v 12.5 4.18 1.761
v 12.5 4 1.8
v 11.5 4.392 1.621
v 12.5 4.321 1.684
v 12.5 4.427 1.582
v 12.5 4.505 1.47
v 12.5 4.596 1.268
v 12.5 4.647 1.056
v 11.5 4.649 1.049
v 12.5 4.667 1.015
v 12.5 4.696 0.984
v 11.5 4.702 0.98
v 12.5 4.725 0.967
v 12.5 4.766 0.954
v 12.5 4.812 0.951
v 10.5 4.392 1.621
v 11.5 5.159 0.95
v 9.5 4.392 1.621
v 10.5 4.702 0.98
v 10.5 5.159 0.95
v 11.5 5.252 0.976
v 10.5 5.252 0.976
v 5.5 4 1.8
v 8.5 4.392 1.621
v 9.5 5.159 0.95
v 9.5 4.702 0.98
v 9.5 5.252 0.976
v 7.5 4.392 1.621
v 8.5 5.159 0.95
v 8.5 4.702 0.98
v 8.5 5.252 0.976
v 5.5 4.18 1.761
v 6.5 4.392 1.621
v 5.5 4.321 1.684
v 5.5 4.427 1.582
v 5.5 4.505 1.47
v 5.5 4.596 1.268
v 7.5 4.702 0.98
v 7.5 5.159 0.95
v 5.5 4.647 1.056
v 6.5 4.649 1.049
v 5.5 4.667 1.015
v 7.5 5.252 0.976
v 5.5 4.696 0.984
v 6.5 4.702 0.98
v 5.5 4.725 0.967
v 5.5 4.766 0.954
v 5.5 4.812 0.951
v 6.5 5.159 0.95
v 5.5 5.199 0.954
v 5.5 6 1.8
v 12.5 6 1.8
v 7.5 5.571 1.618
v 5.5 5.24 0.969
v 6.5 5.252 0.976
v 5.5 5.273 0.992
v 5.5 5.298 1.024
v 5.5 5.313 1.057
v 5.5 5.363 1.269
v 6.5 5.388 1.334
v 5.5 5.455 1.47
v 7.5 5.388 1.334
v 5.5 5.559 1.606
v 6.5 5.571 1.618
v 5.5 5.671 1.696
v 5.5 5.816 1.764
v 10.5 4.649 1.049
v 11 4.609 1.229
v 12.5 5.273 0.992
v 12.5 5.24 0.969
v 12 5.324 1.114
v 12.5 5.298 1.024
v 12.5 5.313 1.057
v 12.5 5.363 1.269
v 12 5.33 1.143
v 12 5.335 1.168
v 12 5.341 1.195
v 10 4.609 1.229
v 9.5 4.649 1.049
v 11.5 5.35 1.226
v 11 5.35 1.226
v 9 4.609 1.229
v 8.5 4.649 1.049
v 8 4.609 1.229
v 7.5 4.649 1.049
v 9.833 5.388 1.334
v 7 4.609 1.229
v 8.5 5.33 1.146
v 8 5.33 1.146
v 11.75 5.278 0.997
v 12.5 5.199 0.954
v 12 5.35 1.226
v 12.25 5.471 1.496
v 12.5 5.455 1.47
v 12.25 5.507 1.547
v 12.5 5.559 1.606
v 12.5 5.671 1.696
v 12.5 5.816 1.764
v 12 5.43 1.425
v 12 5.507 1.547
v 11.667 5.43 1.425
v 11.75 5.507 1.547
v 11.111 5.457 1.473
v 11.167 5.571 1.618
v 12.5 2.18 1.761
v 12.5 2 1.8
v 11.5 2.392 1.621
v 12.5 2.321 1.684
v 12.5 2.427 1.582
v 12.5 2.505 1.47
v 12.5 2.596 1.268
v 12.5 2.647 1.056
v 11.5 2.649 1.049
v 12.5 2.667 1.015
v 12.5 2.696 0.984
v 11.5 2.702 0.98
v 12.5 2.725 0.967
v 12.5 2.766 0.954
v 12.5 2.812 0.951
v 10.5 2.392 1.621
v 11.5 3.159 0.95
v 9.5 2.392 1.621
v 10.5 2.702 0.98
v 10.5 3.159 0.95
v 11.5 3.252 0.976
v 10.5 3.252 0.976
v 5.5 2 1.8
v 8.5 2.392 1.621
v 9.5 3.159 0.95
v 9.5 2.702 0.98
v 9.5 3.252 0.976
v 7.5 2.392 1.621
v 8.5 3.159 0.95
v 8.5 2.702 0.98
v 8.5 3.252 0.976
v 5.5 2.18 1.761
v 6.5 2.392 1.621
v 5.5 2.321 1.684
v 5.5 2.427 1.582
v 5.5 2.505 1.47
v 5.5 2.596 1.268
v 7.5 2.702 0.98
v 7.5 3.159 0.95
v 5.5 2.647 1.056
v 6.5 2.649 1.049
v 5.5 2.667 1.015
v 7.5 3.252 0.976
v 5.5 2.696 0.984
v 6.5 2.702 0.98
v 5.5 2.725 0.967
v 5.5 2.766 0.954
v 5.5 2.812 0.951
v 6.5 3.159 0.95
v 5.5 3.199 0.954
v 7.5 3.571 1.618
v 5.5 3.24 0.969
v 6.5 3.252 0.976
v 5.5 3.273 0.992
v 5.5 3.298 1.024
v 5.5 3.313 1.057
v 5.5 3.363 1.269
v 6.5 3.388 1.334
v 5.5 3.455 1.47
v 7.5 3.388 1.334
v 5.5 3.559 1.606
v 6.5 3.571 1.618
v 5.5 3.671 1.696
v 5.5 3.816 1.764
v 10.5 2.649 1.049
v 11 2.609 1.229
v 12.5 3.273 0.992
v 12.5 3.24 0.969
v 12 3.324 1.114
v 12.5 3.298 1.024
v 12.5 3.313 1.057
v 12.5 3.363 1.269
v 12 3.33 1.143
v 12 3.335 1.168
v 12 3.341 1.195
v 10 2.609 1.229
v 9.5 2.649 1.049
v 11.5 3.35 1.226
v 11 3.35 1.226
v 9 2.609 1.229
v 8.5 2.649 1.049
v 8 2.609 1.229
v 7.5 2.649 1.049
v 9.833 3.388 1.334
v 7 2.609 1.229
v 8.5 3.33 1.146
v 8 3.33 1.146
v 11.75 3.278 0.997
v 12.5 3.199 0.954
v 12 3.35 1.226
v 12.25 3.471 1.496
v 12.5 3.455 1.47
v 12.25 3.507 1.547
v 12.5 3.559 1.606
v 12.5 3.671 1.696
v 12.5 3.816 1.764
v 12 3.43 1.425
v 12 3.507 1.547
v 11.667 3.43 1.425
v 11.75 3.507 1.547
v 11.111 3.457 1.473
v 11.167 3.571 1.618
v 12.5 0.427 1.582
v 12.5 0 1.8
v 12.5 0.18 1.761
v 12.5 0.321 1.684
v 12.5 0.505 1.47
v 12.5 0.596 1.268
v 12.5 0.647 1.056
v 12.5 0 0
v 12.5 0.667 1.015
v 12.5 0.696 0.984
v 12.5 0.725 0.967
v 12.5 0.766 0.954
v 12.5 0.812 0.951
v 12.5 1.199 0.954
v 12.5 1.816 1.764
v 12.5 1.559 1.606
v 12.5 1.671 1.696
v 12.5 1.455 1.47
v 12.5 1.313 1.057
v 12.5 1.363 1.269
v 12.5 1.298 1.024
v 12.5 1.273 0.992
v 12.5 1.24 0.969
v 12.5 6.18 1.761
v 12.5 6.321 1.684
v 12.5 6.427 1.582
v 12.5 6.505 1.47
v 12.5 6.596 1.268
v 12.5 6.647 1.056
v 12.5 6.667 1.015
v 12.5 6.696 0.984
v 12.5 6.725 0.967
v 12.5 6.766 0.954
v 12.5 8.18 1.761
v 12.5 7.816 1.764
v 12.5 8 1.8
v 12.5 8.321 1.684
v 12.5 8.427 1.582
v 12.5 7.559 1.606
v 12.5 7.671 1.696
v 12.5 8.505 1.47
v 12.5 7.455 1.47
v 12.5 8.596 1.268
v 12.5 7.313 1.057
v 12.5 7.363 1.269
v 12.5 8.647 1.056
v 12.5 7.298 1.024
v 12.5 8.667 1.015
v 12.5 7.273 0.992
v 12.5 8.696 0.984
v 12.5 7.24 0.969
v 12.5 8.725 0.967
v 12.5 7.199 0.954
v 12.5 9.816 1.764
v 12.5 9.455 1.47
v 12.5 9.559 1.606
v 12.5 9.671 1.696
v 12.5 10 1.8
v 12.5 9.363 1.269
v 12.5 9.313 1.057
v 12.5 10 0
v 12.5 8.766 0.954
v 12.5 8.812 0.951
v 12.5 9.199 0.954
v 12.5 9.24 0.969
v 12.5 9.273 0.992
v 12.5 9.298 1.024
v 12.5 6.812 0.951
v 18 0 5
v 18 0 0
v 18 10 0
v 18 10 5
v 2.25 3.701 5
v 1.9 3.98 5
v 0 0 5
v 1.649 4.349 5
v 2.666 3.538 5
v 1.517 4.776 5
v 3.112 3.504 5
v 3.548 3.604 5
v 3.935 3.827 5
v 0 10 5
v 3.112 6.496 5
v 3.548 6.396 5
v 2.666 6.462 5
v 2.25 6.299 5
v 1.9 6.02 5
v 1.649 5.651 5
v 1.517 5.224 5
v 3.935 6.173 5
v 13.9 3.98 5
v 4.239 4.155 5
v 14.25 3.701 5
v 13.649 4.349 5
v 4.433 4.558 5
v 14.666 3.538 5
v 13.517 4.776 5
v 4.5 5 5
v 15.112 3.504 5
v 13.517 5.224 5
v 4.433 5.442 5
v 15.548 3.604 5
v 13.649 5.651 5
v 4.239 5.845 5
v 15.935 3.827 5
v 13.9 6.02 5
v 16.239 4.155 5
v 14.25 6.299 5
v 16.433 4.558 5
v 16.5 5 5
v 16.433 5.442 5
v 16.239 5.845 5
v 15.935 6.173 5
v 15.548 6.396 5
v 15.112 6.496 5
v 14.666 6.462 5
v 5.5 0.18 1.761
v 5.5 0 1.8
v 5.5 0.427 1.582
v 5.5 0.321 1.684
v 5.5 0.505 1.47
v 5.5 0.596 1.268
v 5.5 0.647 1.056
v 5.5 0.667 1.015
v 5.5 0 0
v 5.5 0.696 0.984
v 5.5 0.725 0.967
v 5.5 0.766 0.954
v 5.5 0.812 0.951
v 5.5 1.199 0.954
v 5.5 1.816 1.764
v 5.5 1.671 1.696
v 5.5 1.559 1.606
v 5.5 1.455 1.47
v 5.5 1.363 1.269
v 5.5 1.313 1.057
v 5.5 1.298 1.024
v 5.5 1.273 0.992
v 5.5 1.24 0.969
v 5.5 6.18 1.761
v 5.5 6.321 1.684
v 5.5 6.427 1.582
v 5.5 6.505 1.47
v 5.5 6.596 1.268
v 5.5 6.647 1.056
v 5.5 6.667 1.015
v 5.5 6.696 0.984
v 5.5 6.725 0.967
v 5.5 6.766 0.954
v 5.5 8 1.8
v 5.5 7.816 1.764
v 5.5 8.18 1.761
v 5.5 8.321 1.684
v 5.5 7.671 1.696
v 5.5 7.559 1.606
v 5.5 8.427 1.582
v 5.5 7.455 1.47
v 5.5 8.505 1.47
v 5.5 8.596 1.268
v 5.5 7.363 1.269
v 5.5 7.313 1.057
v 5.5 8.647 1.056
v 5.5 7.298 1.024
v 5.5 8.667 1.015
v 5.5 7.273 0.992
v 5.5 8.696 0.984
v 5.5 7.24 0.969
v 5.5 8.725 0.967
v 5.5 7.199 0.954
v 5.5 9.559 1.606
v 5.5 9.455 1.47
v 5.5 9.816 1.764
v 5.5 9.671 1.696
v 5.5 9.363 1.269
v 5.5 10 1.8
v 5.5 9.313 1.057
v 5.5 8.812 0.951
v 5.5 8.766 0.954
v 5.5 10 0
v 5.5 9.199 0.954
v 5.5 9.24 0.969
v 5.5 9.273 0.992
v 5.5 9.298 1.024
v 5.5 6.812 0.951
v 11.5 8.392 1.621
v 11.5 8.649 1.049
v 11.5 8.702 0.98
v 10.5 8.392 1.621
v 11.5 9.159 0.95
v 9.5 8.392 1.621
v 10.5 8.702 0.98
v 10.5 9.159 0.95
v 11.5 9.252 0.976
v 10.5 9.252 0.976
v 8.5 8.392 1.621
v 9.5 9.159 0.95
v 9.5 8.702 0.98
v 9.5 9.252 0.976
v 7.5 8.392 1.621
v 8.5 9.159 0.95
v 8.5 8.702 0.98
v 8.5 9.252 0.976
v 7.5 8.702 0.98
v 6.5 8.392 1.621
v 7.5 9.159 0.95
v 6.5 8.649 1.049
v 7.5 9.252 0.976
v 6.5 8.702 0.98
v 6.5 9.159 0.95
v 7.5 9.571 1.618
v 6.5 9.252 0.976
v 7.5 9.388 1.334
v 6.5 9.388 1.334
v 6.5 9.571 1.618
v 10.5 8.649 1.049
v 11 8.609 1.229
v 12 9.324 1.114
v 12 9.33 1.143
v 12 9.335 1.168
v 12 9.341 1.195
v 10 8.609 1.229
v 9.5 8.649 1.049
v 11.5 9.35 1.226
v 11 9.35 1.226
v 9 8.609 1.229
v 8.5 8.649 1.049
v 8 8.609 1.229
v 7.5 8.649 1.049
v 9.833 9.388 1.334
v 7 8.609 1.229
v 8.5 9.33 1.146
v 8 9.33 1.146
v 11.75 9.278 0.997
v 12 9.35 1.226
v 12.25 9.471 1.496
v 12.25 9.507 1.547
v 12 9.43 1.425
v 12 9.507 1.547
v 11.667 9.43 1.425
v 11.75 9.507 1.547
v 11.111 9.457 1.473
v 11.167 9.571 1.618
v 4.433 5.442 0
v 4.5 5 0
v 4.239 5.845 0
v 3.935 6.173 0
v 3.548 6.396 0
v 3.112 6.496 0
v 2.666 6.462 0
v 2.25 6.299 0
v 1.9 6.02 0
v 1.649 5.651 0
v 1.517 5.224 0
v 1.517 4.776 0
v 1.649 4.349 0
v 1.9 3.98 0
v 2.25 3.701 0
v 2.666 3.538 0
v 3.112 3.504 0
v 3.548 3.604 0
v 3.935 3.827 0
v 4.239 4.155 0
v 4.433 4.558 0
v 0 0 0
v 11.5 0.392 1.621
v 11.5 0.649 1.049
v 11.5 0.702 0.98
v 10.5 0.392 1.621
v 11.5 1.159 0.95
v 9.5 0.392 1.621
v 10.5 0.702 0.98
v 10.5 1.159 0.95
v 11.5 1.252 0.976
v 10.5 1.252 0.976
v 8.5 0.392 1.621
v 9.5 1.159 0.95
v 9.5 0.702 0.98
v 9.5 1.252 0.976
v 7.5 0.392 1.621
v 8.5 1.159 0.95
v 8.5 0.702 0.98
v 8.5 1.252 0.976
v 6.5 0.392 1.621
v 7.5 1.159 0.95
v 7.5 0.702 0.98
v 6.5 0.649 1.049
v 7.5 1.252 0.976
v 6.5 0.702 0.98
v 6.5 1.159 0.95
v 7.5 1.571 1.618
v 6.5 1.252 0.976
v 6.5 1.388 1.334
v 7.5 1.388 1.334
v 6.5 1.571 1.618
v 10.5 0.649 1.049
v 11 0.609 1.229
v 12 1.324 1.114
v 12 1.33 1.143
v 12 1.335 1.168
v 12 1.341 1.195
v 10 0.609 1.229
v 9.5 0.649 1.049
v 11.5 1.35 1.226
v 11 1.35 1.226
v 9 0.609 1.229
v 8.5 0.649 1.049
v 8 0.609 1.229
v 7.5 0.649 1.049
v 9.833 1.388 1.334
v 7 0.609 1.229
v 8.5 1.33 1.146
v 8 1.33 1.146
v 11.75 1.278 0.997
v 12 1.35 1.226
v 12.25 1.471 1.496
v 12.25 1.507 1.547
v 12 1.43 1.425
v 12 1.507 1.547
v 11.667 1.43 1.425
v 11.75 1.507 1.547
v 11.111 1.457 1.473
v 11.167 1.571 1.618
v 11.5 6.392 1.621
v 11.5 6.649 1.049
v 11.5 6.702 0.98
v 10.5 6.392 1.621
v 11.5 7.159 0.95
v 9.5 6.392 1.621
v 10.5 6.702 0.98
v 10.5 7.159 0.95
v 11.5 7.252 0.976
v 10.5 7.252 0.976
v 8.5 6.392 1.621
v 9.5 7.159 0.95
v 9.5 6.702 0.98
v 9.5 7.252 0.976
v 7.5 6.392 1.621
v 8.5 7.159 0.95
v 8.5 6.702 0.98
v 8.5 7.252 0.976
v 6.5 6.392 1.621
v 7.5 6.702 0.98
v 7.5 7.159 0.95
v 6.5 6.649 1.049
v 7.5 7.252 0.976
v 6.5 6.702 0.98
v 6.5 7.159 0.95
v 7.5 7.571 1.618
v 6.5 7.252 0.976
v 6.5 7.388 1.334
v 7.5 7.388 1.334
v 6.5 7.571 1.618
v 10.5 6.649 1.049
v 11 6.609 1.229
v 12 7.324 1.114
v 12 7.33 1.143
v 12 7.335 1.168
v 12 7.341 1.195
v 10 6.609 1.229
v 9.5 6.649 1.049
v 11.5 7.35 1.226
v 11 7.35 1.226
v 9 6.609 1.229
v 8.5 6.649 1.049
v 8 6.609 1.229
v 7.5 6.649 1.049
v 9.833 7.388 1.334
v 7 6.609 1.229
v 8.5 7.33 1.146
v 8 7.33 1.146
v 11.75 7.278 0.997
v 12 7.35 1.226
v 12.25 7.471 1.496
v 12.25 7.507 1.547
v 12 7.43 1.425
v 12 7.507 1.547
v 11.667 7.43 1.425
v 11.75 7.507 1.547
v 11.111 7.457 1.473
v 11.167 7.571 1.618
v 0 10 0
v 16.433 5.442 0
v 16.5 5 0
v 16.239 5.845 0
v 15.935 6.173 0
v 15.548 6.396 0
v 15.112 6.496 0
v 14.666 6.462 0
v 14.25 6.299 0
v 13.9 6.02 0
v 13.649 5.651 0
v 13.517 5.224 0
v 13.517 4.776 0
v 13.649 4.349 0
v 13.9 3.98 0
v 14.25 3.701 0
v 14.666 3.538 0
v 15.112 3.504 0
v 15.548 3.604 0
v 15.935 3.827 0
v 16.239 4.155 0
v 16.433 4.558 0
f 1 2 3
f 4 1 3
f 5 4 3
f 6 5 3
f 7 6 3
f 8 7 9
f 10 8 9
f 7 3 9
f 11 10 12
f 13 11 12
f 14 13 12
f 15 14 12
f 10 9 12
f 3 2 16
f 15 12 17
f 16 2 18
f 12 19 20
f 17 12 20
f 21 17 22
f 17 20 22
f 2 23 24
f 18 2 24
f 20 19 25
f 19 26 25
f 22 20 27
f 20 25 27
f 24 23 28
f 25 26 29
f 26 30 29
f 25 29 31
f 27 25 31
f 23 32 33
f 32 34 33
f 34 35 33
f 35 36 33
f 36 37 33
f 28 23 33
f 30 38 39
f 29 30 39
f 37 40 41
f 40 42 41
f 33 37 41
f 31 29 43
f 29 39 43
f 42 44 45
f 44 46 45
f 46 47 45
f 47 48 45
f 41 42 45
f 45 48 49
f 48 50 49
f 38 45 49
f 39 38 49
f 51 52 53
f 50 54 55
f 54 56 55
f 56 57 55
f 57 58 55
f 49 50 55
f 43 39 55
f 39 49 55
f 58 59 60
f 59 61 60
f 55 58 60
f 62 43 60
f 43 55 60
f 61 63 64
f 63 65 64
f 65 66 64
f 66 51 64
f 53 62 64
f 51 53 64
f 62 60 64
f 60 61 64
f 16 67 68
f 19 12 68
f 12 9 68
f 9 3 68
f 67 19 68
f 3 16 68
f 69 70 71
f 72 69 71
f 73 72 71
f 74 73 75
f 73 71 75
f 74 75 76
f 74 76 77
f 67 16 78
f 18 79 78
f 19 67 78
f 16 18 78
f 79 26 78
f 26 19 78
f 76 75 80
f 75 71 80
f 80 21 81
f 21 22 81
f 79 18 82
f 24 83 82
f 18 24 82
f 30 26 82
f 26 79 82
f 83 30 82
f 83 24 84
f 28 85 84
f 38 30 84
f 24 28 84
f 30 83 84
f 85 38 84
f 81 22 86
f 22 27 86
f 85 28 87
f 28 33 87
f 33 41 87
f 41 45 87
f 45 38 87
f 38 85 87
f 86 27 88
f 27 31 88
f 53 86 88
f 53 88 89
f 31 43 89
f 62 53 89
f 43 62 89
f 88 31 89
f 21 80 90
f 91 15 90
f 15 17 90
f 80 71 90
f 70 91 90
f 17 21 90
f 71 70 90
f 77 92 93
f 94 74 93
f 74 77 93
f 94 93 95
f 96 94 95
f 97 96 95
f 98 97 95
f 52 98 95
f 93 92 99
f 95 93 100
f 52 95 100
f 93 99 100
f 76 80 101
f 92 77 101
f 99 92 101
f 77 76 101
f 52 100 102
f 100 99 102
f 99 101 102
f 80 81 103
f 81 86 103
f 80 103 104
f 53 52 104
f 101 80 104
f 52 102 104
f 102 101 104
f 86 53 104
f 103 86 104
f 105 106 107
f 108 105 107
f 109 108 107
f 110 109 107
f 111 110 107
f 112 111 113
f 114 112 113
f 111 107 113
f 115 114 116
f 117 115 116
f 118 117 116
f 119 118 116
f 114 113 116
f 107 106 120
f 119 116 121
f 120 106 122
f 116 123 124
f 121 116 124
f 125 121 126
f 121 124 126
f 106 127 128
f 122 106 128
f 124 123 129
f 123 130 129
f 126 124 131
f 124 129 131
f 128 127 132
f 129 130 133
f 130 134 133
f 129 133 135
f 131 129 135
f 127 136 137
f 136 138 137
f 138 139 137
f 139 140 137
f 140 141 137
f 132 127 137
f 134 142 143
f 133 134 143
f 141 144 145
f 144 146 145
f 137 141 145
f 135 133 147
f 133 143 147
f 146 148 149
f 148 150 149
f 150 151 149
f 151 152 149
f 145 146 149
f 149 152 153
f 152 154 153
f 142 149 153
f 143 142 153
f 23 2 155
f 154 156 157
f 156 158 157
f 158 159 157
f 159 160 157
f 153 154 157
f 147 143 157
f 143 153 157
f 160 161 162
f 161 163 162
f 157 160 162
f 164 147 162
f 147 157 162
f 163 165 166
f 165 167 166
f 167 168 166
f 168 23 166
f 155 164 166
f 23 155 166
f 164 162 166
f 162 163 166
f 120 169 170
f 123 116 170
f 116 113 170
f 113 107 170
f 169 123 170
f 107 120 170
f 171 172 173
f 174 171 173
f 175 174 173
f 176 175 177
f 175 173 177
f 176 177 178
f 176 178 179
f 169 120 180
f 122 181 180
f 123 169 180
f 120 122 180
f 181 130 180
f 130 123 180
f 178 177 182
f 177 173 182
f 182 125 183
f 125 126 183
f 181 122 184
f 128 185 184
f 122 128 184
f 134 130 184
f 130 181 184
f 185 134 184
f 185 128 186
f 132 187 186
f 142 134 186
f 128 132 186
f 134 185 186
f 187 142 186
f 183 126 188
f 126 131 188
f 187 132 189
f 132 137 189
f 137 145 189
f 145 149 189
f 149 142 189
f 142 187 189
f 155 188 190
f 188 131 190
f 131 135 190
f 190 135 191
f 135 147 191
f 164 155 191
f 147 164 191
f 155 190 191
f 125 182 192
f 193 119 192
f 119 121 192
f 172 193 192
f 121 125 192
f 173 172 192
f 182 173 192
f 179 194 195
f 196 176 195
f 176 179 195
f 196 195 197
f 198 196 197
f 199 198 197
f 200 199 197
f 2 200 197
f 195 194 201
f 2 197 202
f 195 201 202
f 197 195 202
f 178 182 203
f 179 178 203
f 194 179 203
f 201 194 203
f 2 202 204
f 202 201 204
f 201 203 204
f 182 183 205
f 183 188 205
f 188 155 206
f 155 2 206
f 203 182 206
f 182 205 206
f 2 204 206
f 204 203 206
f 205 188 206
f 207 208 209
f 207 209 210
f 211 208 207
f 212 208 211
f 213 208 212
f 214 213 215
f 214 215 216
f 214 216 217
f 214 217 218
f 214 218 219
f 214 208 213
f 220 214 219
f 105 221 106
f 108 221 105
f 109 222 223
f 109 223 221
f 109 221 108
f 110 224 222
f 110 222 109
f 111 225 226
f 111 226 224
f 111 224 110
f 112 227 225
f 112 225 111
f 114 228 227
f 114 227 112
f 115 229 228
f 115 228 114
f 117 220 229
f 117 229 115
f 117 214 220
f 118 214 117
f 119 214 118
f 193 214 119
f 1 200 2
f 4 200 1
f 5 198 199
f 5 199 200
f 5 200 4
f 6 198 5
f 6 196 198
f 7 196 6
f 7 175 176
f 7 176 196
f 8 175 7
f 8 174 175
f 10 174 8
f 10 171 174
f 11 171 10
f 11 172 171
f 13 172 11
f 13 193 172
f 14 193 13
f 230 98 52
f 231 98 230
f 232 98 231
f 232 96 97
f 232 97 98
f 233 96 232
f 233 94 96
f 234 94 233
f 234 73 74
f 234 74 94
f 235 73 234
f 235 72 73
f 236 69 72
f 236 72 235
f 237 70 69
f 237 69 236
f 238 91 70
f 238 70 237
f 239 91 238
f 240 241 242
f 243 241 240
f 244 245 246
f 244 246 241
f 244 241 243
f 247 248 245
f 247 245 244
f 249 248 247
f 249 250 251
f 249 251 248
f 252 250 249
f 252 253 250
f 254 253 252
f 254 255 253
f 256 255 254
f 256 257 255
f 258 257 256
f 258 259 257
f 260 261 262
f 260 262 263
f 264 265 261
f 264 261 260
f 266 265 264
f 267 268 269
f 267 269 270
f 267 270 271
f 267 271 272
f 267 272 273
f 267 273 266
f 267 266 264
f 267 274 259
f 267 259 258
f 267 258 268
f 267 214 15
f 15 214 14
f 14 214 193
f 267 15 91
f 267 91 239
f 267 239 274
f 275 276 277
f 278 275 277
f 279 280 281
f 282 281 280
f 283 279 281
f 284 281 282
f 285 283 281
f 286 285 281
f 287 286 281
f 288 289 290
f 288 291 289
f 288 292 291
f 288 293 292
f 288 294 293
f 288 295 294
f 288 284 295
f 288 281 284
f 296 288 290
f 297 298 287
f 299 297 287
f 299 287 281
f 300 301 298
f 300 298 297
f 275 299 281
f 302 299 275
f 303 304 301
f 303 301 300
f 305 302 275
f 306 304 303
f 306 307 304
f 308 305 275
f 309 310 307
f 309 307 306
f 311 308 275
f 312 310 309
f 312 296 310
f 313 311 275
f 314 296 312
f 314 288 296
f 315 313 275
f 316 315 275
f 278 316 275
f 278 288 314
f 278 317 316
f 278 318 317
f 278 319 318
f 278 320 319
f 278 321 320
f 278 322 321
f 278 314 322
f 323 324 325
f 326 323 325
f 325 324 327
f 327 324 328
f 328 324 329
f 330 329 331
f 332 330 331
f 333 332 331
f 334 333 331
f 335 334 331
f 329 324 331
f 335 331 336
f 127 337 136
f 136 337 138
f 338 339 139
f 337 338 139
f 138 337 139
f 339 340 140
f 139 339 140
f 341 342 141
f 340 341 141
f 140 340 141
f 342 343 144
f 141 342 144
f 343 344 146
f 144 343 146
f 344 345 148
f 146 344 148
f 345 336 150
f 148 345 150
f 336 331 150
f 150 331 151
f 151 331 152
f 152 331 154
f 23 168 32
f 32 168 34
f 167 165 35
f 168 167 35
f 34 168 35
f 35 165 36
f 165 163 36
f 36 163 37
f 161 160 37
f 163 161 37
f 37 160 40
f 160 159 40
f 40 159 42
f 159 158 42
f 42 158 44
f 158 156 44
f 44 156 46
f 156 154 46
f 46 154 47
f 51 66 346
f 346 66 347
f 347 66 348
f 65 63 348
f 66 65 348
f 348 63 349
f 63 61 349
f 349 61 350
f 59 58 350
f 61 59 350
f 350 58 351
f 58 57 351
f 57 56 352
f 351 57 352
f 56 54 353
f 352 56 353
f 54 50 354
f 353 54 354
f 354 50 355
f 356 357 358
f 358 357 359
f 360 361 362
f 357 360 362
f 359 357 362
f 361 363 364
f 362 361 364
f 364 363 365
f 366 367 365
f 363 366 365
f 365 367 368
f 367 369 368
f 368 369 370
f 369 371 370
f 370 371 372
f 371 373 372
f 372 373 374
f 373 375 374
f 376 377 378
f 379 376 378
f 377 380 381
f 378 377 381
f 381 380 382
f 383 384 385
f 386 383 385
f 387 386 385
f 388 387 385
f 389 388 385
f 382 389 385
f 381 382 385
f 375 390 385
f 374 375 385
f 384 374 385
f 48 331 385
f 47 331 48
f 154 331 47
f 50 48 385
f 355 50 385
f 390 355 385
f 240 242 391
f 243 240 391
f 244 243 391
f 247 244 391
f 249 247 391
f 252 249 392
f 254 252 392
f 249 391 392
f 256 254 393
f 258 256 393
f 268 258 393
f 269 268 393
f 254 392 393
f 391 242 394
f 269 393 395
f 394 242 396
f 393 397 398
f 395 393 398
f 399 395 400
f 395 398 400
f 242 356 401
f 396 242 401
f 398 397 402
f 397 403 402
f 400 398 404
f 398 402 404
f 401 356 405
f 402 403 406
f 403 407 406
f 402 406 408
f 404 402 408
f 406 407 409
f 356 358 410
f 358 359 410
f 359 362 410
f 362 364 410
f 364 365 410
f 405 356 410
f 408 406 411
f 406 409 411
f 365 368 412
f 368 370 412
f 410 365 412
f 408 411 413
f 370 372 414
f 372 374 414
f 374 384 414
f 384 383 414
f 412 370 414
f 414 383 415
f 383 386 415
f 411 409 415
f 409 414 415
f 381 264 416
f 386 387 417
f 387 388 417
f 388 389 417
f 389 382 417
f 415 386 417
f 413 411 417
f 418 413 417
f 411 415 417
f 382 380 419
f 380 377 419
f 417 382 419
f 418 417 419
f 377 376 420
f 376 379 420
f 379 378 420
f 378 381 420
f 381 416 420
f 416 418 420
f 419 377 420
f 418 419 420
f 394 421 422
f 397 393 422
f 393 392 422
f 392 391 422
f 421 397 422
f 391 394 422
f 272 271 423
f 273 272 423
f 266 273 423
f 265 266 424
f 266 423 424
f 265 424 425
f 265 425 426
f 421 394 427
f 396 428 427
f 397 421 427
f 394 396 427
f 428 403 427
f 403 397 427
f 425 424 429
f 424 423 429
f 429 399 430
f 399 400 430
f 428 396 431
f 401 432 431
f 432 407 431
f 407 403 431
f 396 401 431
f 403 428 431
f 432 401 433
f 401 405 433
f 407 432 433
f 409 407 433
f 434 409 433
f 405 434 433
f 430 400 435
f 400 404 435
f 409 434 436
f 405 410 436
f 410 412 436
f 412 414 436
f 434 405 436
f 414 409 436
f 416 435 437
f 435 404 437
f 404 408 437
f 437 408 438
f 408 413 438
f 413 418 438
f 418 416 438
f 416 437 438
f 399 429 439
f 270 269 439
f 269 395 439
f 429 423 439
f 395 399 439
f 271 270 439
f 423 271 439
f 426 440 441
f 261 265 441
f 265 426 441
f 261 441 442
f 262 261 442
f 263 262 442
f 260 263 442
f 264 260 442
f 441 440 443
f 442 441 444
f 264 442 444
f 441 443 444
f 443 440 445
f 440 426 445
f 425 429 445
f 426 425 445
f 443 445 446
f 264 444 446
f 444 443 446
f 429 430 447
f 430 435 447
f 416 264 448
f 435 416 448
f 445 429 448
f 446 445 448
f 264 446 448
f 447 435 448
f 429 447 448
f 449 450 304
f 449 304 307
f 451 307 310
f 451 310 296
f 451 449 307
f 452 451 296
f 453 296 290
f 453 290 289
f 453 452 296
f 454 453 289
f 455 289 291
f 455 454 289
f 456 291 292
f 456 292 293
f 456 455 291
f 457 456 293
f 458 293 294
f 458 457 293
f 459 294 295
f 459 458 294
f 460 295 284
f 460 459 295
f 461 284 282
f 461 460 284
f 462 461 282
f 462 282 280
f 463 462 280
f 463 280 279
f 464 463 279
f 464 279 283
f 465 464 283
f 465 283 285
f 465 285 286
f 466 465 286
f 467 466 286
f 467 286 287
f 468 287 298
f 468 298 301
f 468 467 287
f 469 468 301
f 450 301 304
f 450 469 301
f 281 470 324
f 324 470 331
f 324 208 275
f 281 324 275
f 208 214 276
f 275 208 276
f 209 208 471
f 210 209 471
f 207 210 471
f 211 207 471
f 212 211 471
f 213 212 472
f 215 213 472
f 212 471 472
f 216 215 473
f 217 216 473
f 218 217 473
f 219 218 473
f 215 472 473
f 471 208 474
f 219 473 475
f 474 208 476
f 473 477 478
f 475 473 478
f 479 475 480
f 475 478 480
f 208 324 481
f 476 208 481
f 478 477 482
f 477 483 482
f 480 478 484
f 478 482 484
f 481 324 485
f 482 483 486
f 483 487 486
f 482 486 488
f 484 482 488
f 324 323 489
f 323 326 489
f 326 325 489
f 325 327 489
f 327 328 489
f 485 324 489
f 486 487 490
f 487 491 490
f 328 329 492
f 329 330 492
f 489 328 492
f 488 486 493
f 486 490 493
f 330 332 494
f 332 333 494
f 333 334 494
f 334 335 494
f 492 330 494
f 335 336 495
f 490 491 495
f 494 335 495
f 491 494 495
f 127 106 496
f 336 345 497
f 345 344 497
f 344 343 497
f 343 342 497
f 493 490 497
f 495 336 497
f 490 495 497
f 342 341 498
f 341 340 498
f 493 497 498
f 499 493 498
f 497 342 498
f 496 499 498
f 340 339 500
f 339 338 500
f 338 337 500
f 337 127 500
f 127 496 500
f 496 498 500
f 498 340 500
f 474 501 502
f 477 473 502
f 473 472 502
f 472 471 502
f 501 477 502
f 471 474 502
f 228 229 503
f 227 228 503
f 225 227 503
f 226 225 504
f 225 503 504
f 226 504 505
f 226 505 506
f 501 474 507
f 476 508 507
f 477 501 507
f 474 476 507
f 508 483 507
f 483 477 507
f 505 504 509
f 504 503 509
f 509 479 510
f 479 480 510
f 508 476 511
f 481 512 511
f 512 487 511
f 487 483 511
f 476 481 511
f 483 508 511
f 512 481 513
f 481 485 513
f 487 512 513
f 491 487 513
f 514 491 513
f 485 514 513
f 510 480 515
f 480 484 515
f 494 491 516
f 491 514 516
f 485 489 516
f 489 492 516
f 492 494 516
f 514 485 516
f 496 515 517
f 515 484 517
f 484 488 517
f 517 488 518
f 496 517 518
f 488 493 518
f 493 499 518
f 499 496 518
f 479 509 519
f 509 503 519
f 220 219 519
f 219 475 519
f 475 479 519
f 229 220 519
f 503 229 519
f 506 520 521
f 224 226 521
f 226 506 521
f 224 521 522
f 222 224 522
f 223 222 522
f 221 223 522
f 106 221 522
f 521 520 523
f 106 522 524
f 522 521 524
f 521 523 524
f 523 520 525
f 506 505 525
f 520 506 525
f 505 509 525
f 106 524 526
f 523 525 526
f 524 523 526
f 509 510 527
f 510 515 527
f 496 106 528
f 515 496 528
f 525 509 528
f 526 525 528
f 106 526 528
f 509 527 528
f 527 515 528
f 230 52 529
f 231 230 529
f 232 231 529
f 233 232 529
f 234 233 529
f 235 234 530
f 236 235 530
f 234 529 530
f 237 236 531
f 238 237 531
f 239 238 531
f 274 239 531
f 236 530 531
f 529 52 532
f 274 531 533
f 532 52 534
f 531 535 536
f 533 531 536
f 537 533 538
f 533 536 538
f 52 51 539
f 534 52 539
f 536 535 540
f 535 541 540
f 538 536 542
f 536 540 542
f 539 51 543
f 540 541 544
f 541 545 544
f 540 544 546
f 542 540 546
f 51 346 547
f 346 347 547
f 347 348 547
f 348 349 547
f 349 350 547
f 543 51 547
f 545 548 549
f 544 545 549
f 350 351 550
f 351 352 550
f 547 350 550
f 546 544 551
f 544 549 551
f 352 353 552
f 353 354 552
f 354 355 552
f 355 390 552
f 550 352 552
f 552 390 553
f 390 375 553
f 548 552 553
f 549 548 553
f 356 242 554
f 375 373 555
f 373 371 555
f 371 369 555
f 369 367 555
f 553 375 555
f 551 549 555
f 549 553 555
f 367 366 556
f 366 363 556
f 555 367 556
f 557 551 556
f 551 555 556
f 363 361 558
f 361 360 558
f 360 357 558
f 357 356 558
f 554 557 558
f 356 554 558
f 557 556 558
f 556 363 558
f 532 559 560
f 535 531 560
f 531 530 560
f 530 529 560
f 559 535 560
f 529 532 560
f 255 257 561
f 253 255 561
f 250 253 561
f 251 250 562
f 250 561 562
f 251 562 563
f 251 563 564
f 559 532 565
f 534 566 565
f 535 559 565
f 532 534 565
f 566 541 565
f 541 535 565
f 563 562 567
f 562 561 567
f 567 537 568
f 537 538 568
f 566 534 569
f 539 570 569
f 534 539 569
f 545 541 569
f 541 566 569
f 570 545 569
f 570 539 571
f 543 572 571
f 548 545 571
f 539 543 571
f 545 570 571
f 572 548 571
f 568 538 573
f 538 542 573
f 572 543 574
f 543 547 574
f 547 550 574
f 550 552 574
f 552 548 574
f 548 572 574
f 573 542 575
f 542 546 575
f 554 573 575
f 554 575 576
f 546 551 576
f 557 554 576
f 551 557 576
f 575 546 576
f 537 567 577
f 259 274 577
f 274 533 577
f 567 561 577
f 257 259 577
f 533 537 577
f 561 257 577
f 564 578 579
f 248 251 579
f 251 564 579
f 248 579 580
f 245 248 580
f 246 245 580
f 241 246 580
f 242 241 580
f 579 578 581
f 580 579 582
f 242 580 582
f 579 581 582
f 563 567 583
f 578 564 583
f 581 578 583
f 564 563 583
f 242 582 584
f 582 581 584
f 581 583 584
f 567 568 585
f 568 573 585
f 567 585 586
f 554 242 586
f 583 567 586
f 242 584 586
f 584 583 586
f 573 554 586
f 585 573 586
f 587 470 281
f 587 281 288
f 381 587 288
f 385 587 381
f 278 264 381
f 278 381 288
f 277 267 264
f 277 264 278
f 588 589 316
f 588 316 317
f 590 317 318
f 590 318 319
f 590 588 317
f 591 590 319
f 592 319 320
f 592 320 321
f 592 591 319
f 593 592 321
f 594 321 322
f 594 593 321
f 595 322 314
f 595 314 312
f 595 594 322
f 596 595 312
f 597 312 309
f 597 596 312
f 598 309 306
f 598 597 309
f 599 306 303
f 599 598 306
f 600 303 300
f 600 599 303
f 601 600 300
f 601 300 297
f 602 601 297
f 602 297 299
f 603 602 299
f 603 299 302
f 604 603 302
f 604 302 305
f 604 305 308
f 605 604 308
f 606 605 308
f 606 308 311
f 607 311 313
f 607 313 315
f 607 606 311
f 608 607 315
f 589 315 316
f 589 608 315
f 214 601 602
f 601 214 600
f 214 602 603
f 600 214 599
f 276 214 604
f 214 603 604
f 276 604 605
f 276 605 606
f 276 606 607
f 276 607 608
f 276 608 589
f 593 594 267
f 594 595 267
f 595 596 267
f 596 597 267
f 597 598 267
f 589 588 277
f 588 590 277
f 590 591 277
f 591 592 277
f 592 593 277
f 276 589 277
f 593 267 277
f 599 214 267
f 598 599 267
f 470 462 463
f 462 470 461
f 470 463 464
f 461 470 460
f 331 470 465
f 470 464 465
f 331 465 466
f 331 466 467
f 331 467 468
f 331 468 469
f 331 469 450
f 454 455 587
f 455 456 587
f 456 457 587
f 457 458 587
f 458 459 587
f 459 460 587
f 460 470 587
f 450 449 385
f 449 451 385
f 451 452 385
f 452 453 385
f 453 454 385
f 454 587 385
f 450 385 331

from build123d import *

# Parameters (mm, degrees)
SKETCH_W     = 18
SKETCH_H     = 10
SKETCH_R     = 1.5
PAD_DEPTH    = 5
SKETCH009_W  = 7
SKETCH009_H  = 10
POCKET_DEPTH = 1.8
PAD001_DEPTH = 7


with BuildPart() as part:
    # Sketch → Pad (new body)
    with BuildSketch(Plane.XY):
        with Locations((9, 5)):
            Rectangle(SKETCH_W, SKETCH_H)
        with Locations((3, 5)):
            Circle(SKETCH_R, mode=Mode.SUBTRACT)
        with Locations((15, 5)):
            Circle(SKETCH_R, mode=Mode.SUBTRACT)
    extrude(amount=PAD_DEPTH)

    # Sketch009 → Pocket (cut)
    with BuildSketch(Plane.XY):
        with Locations((9, 5)):
            Rectangle(SKETCH009_W, SKETCH009_H)
    extrude(amount=POCKET_DEPTH, mode=Mode.SUBTRACT)

    # Sketch008 (on DatumPlane) → Pad001 (join)
    with BuildSketch(Plane(origin=(5.5, 0, 1.8), x_dir=(0, 1, 0), z_dir=(1, 0, 0))):
        with BuildLine():
            add(Edge.make_bspline(
                [(0, 0), (0.35359, -0.026741), (0.649381, -0.565336), (0.617792, -0.761919), (0.721021, -0.848783), (0.871627, -0.848783), (1.086099, -0.848783), (1.231939, -0.850694), (1.339653, -0.771577), (1.309148, -0.564354), (1.603926, -0.032231), (2, 0)],
                knots=[0, 0, 0, 0, 0.142857, 0.285714, 0.428571, 0.428571, 0.571429, 0.571429, 0.714286, 0.857143, 1, 1, 1, 1], degree=3))
            add(Edge.make_bspline(
                [(2, 0), (2.35359, -0.026741), (2.649381, -0.565336), (2.617792, -0.761919), (2.721021, -0.848783), (2.871627, -0.848783), (3.086099, -0.848783), (3.231939, -0.850694), (3.339653, -0.771577), (3.309148, -0.564354), (3.603926, -0.032231), (4, 0)],
                knots=[0, 0, 0, 0, 0.142857, 0.285714, 0.428571, 0.428571, 0.571429, 0.571429, 0.714286, 0.857143, 1, 1, 1, 1], degree=3))
            add(Edge.make_bspline(
                [(4, 0), (4.35359, -0.026741), (4.649381, -0.565336), (4.617792, -0.761919), (4.721021, -0.848783), (4.871627, -0.848783), (5.086099, -0.848783), (5.231939, -0.850694), (5.339653, -0.771577), (5.309148, -0.564354), (5.603926, -0.032231), (6, 0)],
                knots=[0, 0, 0, 0, 0.142857, 0.285714, 0.428571, 0.428571, 0.571429, 0.571429, 0.714286, 0.857143, 1, 1, 1, 1], degree=3))
            add(Edge.make_bspline(
                [(6, 0), (6.35359, -0.026741), (6.649381, -0.565336), (6.617792, -0.761919), (6.721021, -0.848783), (6.871627, -0.848783), (7.086099, -0.848783), (7.231939, -0.850694), (7.339653, -0.771577), (7.309148, -0.564354), (7.603926, -0.032231), (8, 0)],
                knots=[0, 0, 0, 0, 0.142857, 0.285714, 0.428571, 0.428571, 0.571429, 0.571429, 0.714286, 0.857143, 1, 1, 1, 1], degree=3))
            add(Edge.make_bspline(
                [(8, 0), (8.35359, -0.026741), (8.649381, -0.565336), (8.617792, -0.761919), (8.721021, -0.848783), (8.871627, -0.848783), (9.086099, -0.848783), (9.231939, -0.850694), (9.339653, -0.771577), (9.309148, -0.564354), (9.603926, -0.032231), (10, 0)],
                knots=[0, 0, 0, 0, 0.142857, 0.285714, 0.428571, 0.428571, 0.571429, 0.571429, 0.714286, 0.857143, 1, 1, 1, 1], degree=3))
            Line((10, 0), (10, 0.958783))
            Line((10, 0.958783), (0, 0.958783))
            Line((0, 0.958783), (0, 0))
        make_face()
    extrude(amount=PAD001_DEPTH)


solid = part.part
